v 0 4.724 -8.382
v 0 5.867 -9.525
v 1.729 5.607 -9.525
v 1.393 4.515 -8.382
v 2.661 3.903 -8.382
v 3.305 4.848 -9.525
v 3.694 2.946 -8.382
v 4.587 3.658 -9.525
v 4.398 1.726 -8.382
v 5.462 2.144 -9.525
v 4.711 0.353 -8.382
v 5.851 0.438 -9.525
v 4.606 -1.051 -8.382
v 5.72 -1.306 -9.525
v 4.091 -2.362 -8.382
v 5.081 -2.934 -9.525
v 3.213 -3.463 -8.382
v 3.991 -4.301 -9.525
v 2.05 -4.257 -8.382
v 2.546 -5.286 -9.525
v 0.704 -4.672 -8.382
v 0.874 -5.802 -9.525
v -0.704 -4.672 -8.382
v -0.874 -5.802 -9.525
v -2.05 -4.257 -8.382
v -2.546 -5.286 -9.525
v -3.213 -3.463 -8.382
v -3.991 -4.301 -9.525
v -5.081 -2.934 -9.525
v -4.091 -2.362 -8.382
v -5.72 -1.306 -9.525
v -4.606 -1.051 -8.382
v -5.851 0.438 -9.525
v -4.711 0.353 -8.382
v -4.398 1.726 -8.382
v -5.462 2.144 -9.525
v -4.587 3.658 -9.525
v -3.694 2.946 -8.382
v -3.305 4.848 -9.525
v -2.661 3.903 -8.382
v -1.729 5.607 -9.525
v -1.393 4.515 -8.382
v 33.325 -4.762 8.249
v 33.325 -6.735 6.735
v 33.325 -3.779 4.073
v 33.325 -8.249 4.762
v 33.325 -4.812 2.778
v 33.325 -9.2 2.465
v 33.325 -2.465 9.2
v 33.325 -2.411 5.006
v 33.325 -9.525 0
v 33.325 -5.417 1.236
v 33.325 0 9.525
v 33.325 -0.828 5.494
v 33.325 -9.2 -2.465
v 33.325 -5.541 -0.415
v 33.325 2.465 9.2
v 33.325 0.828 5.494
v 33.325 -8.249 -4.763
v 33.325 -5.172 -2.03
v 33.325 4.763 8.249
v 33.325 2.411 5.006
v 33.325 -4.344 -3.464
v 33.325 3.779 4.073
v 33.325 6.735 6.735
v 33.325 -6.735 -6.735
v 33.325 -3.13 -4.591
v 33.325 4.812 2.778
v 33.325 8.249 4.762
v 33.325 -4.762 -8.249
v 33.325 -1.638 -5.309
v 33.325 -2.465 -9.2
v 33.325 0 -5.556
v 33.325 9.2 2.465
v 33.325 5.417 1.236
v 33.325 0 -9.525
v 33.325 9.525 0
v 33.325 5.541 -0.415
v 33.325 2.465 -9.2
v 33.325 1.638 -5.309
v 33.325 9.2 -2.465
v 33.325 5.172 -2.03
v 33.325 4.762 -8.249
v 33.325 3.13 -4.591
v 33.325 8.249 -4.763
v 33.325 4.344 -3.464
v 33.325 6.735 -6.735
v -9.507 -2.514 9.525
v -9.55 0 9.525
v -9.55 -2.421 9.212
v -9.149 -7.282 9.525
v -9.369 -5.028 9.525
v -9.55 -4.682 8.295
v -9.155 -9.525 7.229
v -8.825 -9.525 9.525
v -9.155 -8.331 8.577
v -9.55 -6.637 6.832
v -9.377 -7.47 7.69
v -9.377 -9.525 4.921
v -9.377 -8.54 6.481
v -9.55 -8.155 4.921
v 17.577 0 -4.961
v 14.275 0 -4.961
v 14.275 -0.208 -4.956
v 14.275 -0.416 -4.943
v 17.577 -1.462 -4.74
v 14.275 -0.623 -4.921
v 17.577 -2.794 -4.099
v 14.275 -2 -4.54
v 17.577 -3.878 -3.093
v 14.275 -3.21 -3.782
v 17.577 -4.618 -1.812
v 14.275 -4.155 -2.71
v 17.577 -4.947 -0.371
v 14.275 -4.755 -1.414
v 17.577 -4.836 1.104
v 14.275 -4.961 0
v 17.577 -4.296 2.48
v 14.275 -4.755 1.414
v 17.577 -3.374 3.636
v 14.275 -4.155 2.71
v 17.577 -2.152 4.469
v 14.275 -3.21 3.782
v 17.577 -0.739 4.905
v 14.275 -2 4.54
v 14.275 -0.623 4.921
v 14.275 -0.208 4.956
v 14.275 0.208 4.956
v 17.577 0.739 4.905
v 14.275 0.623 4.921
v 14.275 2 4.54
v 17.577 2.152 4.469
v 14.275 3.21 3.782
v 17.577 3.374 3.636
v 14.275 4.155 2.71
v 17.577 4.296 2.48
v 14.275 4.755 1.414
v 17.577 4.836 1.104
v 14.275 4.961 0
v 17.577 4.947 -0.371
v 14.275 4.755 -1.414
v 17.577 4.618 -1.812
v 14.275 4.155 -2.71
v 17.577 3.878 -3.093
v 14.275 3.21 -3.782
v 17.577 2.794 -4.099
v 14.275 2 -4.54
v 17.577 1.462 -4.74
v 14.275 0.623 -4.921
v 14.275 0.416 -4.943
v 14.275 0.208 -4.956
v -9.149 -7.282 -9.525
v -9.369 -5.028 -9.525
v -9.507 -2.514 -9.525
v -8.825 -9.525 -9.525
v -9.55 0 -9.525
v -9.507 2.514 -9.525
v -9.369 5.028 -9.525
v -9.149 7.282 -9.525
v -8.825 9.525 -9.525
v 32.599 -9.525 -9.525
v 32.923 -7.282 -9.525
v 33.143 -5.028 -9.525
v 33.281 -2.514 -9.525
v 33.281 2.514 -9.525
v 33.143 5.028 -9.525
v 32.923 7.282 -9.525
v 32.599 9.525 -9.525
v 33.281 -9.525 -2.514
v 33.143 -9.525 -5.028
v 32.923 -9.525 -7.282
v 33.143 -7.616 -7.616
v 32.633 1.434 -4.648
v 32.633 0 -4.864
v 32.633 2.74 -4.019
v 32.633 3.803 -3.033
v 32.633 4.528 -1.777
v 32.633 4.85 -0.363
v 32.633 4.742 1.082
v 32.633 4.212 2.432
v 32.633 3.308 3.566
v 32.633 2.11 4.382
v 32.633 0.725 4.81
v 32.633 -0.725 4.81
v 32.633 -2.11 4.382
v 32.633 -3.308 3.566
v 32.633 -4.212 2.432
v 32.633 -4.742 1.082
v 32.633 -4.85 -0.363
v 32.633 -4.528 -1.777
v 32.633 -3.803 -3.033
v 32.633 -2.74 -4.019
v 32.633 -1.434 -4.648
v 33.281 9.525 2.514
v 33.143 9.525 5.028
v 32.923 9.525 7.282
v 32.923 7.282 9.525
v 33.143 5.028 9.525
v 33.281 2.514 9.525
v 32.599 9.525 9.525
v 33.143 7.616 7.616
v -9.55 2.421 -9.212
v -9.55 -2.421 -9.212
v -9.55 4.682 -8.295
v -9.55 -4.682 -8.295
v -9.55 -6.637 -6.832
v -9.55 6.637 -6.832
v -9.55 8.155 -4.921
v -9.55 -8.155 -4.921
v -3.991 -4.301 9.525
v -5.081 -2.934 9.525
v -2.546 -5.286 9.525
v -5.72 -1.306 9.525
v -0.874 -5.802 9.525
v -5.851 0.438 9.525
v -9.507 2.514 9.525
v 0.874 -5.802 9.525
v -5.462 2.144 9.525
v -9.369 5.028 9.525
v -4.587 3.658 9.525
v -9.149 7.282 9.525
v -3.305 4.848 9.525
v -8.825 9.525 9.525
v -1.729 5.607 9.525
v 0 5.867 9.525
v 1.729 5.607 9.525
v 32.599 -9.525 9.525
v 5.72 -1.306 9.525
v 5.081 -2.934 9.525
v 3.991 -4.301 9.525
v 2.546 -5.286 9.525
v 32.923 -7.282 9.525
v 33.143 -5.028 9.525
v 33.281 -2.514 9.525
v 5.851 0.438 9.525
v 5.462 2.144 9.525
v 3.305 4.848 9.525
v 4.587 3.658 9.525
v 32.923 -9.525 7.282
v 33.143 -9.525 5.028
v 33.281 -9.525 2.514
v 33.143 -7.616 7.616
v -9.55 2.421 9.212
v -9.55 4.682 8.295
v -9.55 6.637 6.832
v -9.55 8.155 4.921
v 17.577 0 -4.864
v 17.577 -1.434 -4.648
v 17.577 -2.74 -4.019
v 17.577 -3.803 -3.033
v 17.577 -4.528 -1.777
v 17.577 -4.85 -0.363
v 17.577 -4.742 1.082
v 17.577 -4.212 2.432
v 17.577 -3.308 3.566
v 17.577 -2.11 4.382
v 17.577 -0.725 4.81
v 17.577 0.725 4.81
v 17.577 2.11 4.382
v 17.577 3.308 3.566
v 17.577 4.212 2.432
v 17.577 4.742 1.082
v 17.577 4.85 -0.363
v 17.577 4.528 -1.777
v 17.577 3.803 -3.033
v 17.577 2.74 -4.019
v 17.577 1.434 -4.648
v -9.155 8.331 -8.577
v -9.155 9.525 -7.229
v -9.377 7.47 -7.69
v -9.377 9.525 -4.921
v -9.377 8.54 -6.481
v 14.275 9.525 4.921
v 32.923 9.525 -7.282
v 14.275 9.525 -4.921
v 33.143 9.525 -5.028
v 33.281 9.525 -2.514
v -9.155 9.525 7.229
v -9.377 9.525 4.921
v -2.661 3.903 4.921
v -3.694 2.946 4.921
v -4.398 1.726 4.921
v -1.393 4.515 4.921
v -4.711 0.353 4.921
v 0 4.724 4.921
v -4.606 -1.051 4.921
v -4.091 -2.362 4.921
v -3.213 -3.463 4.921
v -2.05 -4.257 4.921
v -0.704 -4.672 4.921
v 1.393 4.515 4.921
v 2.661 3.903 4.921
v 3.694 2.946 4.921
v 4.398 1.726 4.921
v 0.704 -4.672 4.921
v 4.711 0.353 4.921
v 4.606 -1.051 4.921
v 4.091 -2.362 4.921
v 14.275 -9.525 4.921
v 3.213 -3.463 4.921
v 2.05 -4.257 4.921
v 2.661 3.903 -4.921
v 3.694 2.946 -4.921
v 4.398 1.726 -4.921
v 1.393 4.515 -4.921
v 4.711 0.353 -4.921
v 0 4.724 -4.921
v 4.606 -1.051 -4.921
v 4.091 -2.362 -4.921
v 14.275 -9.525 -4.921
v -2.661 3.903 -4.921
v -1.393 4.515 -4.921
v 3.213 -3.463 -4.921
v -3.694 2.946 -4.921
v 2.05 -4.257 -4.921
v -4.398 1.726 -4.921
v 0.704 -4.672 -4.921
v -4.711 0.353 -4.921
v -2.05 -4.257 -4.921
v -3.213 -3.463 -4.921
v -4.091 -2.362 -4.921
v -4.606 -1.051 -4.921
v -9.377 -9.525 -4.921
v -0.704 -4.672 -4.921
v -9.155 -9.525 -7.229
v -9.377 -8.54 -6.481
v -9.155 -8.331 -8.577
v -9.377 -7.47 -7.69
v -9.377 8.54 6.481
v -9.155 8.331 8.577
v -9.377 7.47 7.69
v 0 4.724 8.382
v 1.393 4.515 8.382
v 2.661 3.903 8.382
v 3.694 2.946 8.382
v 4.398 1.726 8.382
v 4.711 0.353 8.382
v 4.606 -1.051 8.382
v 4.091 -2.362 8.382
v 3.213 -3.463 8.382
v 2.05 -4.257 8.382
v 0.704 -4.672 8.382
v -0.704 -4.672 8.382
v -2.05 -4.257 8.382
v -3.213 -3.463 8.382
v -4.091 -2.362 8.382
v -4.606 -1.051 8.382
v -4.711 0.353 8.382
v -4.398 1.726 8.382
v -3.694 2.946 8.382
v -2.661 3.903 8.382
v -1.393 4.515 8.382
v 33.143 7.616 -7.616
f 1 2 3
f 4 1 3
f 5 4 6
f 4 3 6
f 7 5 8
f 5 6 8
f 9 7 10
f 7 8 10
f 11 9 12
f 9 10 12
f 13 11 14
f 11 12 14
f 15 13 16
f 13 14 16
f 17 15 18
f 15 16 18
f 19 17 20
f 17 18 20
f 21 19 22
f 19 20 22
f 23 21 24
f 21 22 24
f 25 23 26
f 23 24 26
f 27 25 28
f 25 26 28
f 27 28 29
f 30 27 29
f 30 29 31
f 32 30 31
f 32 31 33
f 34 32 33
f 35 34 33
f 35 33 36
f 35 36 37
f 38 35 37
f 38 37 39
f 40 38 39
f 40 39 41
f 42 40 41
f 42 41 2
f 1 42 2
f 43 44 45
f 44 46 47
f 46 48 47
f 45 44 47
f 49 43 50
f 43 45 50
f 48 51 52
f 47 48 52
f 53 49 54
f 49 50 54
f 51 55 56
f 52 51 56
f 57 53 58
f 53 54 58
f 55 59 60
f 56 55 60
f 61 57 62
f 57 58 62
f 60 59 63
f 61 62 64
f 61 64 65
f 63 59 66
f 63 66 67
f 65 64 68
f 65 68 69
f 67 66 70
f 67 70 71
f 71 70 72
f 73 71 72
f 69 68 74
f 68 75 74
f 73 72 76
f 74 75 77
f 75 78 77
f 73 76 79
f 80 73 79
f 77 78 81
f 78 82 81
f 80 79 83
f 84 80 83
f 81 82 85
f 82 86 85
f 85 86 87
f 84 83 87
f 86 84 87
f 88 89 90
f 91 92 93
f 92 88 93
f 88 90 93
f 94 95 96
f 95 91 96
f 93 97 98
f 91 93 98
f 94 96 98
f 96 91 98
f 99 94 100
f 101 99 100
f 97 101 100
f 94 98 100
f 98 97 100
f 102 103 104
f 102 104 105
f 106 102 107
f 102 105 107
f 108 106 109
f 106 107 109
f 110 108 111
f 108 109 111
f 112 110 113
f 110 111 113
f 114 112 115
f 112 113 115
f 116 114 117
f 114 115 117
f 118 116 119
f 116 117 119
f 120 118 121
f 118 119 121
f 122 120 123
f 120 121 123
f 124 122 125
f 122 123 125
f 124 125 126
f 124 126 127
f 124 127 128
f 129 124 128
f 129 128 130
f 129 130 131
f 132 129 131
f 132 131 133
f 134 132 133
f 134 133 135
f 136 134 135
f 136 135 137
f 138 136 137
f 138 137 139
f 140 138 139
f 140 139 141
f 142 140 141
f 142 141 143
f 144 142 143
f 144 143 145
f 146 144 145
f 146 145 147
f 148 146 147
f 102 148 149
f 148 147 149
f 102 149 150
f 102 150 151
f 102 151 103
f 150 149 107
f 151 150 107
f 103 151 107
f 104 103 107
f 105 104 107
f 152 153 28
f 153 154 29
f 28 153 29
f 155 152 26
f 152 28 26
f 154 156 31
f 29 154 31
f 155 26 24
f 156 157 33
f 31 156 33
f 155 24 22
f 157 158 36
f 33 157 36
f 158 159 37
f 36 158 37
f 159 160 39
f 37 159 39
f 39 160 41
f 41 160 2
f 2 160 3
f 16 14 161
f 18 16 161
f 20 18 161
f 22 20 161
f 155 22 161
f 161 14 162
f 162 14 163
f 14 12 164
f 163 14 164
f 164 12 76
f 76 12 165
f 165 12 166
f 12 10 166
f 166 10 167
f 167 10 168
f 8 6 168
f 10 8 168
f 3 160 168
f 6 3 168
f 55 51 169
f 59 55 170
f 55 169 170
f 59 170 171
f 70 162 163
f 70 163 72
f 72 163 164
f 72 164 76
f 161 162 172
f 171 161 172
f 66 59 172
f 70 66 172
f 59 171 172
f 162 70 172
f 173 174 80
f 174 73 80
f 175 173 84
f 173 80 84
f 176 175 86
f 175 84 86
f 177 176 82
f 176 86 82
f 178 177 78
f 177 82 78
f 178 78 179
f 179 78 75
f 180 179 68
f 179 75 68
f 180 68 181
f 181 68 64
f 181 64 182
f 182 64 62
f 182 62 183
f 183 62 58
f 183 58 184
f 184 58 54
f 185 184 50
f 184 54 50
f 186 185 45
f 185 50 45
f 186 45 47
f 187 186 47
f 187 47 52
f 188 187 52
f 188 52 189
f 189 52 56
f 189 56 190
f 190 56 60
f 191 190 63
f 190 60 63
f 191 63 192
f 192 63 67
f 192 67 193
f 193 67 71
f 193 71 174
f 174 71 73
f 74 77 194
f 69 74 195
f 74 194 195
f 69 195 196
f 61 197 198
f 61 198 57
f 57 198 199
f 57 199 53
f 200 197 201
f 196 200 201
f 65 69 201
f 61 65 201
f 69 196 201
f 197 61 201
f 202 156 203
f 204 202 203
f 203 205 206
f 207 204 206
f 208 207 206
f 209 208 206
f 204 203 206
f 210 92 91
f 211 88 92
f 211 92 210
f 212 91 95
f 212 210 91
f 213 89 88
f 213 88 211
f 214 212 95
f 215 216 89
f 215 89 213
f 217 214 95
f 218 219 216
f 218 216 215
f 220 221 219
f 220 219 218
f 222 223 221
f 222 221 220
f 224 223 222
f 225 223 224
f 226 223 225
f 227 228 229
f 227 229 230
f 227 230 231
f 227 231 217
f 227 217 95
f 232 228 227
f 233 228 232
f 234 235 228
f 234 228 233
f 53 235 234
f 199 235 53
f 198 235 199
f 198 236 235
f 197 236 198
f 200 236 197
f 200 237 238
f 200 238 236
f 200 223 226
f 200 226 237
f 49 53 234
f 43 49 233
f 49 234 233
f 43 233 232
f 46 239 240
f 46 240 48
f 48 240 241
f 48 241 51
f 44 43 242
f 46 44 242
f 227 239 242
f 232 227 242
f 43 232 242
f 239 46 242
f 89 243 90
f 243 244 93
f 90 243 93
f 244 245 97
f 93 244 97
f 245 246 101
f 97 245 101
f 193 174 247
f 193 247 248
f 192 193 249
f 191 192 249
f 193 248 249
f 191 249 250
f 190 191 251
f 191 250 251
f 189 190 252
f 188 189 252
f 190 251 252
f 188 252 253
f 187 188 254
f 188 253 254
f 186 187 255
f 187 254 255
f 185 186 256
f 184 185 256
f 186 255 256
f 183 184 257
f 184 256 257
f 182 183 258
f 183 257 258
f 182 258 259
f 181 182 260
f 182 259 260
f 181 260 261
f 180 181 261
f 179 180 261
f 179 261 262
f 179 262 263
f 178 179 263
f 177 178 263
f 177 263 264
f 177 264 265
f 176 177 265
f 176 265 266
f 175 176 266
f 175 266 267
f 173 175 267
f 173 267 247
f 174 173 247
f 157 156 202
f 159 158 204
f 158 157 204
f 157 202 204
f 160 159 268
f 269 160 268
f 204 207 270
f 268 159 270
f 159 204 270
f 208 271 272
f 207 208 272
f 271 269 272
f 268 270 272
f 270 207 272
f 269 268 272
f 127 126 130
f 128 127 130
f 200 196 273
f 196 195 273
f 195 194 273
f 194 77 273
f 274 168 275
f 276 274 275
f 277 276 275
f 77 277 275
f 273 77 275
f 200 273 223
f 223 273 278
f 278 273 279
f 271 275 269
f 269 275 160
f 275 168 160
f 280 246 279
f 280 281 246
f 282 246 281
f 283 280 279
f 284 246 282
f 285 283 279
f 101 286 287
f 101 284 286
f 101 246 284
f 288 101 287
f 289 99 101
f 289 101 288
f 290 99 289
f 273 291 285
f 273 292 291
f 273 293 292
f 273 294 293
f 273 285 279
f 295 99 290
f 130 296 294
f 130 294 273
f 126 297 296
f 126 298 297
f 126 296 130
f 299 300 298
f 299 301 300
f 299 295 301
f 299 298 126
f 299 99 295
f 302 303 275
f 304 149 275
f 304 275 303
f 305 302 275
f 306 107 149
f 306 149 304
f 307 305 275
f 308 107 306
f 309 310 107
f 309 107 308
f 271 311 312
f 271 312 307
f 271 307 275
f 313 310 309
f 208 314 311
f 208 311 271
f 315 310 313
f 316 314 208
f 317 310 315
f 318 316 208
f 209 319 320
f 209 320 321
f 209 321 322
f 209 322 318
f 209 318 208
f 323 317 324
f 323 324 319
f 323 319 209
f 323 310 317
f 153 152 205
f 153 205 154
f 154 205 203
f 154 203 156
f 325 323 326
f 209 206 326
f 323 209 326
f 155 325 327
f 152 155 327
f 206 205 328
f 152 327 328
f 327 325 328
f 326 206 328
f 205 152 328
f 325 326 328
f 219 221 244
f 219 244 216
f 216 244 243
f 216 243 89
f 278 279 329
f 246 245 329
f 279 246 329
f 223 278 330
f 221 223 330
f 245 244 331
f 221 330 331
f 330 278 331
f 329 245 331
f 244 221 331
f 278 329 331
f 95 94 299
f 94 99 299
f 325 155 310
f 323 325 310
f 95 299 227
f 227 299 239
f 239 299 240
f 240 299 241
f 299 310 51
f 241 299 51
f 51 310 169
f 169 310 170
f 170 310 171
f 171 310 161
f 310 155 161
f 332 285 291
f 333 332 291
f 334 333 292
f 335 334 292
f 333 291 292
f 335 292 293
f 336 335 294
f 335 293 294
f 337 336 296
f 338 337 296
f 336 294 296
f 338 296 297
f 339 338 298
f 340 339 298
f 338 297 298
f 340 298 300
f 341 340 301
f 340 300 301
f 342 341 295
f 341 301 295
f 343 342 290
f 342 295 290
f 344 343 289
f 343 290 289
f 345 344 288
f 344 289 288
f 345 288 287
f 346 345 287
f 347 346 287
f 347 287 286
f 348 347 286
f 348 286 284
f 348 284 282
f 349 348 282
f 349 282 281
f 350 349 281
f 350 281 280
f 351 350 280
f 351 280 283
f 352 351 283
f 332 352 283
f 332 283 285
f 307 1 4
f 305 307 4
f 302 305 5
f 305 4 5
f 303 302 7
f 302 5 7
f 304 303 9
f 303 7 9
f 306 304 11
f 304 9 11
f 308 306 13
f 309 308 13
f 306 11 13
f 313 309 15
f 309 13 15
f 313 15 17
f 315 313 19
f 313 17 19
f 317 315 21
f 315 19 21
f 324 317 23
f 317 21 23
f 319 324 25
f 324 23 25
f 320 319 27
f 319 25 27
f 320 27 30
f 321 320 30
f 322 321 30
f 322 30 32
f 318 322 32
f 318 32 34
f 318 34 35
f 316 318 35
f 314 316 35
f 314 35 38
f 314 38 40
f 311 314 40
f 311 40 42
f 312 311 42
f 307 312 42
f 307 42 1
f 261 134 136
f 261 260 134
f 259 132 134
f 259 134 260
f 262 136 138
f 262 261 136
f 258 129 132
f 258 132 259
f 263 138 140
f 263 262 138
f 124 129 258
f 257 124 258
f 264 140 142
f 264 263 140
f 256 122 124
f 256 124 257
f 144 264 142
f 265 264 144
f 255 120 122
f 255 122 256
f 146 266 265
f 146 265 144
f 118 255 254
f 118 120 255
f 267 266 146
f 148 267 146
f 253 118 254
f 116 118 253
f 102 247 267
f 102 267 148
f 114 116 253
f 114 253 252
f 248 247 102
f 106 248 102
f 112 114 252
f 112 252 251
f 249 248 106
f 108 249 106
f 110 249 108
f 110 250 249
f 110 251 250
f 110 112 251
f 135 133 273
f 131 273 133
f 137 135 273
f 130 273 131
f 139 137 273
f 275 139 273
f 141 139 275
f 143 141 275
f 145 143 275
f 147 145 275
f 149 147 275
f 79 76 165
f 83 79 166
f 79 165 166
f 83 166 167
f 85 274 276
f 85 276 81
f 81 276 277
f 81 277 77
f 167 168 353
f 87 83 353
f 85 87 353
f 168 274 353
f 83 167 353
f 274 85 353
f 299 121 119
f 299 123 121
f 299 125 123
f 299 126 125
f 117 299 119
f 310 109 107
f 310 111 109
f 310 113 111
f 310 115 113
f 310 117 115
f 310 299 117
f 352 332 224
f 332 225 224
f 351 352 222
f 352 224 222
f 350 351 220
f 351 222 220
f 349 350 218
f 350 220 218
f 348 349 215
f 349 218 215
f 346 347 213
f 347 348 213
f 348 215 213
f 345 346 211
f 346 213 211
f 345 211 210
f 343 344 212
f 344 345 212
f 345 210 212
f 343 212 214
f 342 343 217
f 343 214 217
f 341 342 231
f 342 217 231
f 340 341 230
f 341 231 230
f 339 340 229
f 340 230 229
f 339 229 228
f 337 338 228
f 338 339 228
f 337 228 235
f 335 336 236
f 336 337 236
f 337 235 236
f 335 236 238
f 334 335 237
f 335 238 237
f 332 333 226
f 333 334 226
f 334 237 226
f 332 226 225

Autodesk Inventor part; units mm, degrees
sketch "Sketch_1" plane through (0, 0, 0) normal (0, 0, 1) x (1, 0, 0)
  line L0 (-9.5504, 9.525) -> (-9.5504, -9.525)
  line L1 (-9.5504, -9.525) -> (33.3248, -9.525)
  line L2 (33.3248, -9.525) -> (33.3248, 9.525)
  line L3 (33.3248, 9.525) -> (-9.5504, 9.525)
extrude "Extrusion1" add sketch "Sketch_1" along normal mid plane 19.05
sketch "Sketch_2" plane through (0, 0, 0) normal (0, 1, 0) x (-1, 0, 0)
  line L0 (9.5504, -4.9213) -> (9.5504, 4.9213)
  line L1 (9.5504, 4.9213) -> (-14.2748, 4.9213)
  line L2 (-14.2748, 4.9213) -> (-14.2748, -4.9213)
  line L3 (-14.2748, -4.9213) -> (9.5504, -4.9213)
extrude "Extrusion2" cut sketch "Sketch_2" along normal mid plane 19.05
sketch "Sketch3" plane through (33.3248, -9.525, 9.525) normal (1, 0, 0) x (0, 0, -1)
  point P0 (9.525, 9.525)
hole "Hole1" at (33.3248, 0, 0) direction (-1, 0, 0) diameter 9.7282 depth 15.748 countersink diameter 11.1125 countersink angle 90 thread size "7/16-20 UNF" class "2B" standard "ANSI Unified Screw Threads"
sketch "Sketch4" plane through (17.5768, 0, 0) normal (1, 0, 0) x (0, 0, -1)
  point P0 (0, 0)
hole "Hole2" at (17.5768, 0, 0) direction (-1, 0, 0) diameter 9.9212 depth 3.302
sketch "Sketch_5" plane through (0, 0, 0) normal (1, 0, 0) x (0, 1, 0)
  line L0 (0, -9.525) -> (0, 9.525)
  line L1 (0, 9.525) -> (5.8674, 9.525)
  line L2 (5.8674, 9.525) -> (4.7244, 8.382)
  line L3 (4.7244, 8.382) -> (4.7244, -8.382)
  line L4 (4.7244, -8.382) -> (5.8674, -9.525)
  line L5 (5.8674, -9.525) -> (0, -9.525)
  line L6 (0, -9.525) -> (0, 9.525)
revolve "Revolution1" cut sketch "Sketch_5" angle 360 about axis through (0, 0, -9.525) along (0, 0, -1)
sketch "Sketch_9" plane through (0, 0, 0) normal (0, 0, 1) x (1, 0, 0)
  line L0 (42.8498, 0) -> (33.3248, 0)
  line L1 (33.3248, 0) -> (33.3248, 9.525)
  arc A0 (33.3248, 9.525) -> (30.7848, 19.05) centre (-3.664, 4.7625) ccw
  line L2 (30.7848, 19.05) -> (42.8498, 19.05)
  line L3 (42.8498, 19.05) -> (42.8498, 0)
  line L4 (42.8498, 0) -> (33.3248, 0)
revolve "Revolution2" cut sketch "Sketch_9" angle 360 about axis through (42.8498, 0, 0) along (1, 0, 0)
sketch "Sketch_10" plane through (0, 0, 0) normal (0, 0, 1) x (1, 0, 0)
  line L0 (-9.5504, 0) -> (-19.0754, 0)
  line L1 (-19.0754, 0) -> (-19.0754, 19.05)
  line L2 (-19.0754, 19.05) -> (-7.0104, 19.05)
  arc A0 (-7.0104, 19.05) -> (-9.5504, 9.525) centre (27.4384, 4.7625) ccw
  line L3 (-9.5504, 9.525) -> (-9.5504, 0)
  line L4 (-9.5504, 0) -> (-19.0754, 0)
revolve "Revolution3" cut sketch "Sketch_10" angle 360 about axis through (-9.5504, 0, 0) along (1, 0, 0)
ref_plane "dummy_XY" through (0, 0, 0) normal (0, 0, 1) x (1, 0, 0)
ref_plane "dummy_YZ" through (0, 0, 0) normal (1, 0, 0) x (0, 1, 0)
ref_plane "dummy_ZX" through (0, 0, 0) normal (0, 1, 0) x (0, 0, 1)
ref_plane "h1_XY" through (-9.5504, 9.525, 0) normal (0, 0, 1) x (1, 0, 0)
ref_plane "h1_YZ" through (-9.5504, 9.525, 0) normal (1, 0, 0) x (0, 1, 0)
ref_plane "h1_ZX" through (-9.5504, 9.525, 0) normal (0, 1, 0) x (0, 0, 1)
ref_plane "h2_XY" through (-9.5504, -9.525, 0) normal (0, 0, 1) x (1, 0, 0)
ref_plane "h2_YZ" through (-9.5504, -9.525, 0) normal (1, 0, 0) x (0, 1, 0)
ref_plane "h2_ZX" through (-9.5504, -9.525, 0) normal (0, 1, 0) x (0, 0, 1)
ref_plane "l1_XY" through (33.3248, 9.525, 0) normal (0, 0, 1) x (1, 0, 0)
ref_plane "l1_YZ" through (33.3248, 9.525, 0) normal (1, 0, 0) x (0, 1, 0)
ref_plane "l1_ZX" through (33.3248, 9.525, 0) normal (0, 1, 0) x (0, 0, 1)
ref_plane "l11_XY" through (33.3248, 9.525, 0) normal (0, 0, 1) x (1, 0, 0)
ref_plane "l11_YZ" through (33.3248, 9.525, 0) normal (1, 0, 0) x (0, 1, 0)
ref_plane "l11_ZX" through (33.3248, 9.525, 0) normal (0, 1, 0) x (0, 0, 1)
ref_plane "l12_XY" through (0, 9.525, 0) normal (0, 0, 1) x (1, 0, 0)
ref_plane "l12_YZ" through (0, 9.525, 0) normal (1, 0, 0) x (0, 1, 0)
ref_plane "l12_ZX" through (0, 9.525, 0) normal (0, 1, 0) x (0, 0, 1)
ref_plane "l2_XY" through (-9.5504, 9.525, 0) normal (0, 0, 1) x (1, 0, 0)
ref_plane "l2_YZ" through (-9.5504, 9.525, 0) normal (1, 0, 0) x (0, 1, 0)
ref_plane "l2_ZX" through (-9.5504, 9.525, 0) normal (0, 1, 0) x (0, 0, 1)
ref_plane "l21_XY" through (33.3248, 0, 0) normal (0, 1, 0) x (1, 0, 0)
ref_plane "l21_YZ" through (33.3248, 0, 0) normal (1, 0, 0) x (0, 0, -1)
ref_plane "l21_ZX" through (33.3248, 0, 0) normal (0, 0, -1) x (0, 1, 0)
ref_plane "l22_XY" through (14.2748, 0, 0) normal (0, 1, 0) x (1, 0, 0)
ref_plane "l22_YZ" through (14.2748, 0, 0) normal (1, 0, 0) x (0, 0, -1)
ref_plane "l22_ZX" through (14.2748, 0, 0) normal (0, 0, -1) x (0, 1, 0)
ref_plane "piston_rod_clevis_XY" through (33.3248, 0, 0) normal (1, 0, 0) x (0, 0, -1)
ref_plane "piston_rod_clevis_YZ" through (33.3248, 0, 0) normal (0, 0, -1) x (0, 1, 0)
ref_plane "piston_rod_clevis_ZX" through (33.3248, 0, 0) normal (0, 1, 0) x (1, 0, 0)
ref_plane "rod_clevis_body_XY" through (0, 0, 0) normal (0, 0, 1) x (1, 0, 0)
ref_plane "rod_clevis_body_YZ" through (0, 0, 0) normal (1, 0, 0) x (0, 1, 0)
ref_plane "rod_clevis_body_ZX" through (0, 0, 0) normal (0, 1, 0) x (0, 0, 1)
ref_plane "th1_XY" through (33.3248, 5.5563, 0) normal (0, 0, 1) x (1, 0, 0)
ref_plane "th1_YZ" through (33.3248, 5.5563, 0) normal (1, 0, 0) x (0, 1, 0)
ref_plane "th1_ZX" through (33.3248, 5.5563, 0) normal (0, 1, 0) x (0, 0, 1)
ref_plane "th2_XY" through (33.3248, -5.5563, 0) normal (0, 0, 1) x (1, 0, 0)
ref_plane "th2_YZ" through (33.3248, -5.5563, 0) normal (1, 0, 0) x (0, 1, 0)
ref_plane "th2_ZX" through (33.3248, -5.5563, 0) normal (0, 1, 0) x (0, 0, 1)
ref_plane "to_cylinder_XY" through (14.2748, 0, 0) normal (1, 0, 0) x (0, 0, -1)
ref_plane "to_cylinder_YZ" through (14.2748, 0, 0) normal (0, 0, -1) x (0, 1, 0)
ref_plane "to_cylinder_ZX" through (14.2748, 0, 0) normal (0, 1, 0) x (1, 0, 0)
ref_plane "w1_XY" through (33.3248, 0, -9.525) normal (0, 1, 0) x (1, 0, 0)
ref_plane "w1_YZ" through (33.3248, 0, -9.525) normal (1, 0, 0) x (0, 0, -1)
ref_plane "w1_ZX" through (33.3248, 0, -9.525) normal (0, 0, -1) x (0, 1, 0)
ref_plane "w11_XY" through (-9.5504, 0, -4.9213) normal (0, 1, 0) x (1, 0, 0)
ref_plane "w11_YZ" through (-9.5504, 0, -4.9213) normal (1, 0, 0) x (0, 0, -1)
ref_plane "w11_ZX" through (-9.5504, 0, -4.9213) normal (0, 0, -1) x (0, 1, 0)
ref_plane "w12_XY" through (-9.5504, 0, 4.9213) normal (0, 1, 0) x (1, 0, 0)
ref_plane "w12_YZ" through (-9.5504, 0, 4.9213) normal (1, 0, 0) x (0, 0, -1)
ref_plane "w12_ZX" through (-9.5504, 0, 4.9213) normal (0, 0, -1) x (0, 1, 0)
ref_plane "w2_XY" through (33.3248, 0, 9.525) normal (0, 1, 0) x (1, 0, 0)
ref_plane "w2_YZ" through (33.3248, 0, 9.525) normal (1, 0, 0) x (0, 0, -1)
ref_plane "w2_ZX" through (33.3248, 0, 9.525) normal (0, 0, -1) x (0, 1, 0)
properties part number "D-14053" material "Steel"
